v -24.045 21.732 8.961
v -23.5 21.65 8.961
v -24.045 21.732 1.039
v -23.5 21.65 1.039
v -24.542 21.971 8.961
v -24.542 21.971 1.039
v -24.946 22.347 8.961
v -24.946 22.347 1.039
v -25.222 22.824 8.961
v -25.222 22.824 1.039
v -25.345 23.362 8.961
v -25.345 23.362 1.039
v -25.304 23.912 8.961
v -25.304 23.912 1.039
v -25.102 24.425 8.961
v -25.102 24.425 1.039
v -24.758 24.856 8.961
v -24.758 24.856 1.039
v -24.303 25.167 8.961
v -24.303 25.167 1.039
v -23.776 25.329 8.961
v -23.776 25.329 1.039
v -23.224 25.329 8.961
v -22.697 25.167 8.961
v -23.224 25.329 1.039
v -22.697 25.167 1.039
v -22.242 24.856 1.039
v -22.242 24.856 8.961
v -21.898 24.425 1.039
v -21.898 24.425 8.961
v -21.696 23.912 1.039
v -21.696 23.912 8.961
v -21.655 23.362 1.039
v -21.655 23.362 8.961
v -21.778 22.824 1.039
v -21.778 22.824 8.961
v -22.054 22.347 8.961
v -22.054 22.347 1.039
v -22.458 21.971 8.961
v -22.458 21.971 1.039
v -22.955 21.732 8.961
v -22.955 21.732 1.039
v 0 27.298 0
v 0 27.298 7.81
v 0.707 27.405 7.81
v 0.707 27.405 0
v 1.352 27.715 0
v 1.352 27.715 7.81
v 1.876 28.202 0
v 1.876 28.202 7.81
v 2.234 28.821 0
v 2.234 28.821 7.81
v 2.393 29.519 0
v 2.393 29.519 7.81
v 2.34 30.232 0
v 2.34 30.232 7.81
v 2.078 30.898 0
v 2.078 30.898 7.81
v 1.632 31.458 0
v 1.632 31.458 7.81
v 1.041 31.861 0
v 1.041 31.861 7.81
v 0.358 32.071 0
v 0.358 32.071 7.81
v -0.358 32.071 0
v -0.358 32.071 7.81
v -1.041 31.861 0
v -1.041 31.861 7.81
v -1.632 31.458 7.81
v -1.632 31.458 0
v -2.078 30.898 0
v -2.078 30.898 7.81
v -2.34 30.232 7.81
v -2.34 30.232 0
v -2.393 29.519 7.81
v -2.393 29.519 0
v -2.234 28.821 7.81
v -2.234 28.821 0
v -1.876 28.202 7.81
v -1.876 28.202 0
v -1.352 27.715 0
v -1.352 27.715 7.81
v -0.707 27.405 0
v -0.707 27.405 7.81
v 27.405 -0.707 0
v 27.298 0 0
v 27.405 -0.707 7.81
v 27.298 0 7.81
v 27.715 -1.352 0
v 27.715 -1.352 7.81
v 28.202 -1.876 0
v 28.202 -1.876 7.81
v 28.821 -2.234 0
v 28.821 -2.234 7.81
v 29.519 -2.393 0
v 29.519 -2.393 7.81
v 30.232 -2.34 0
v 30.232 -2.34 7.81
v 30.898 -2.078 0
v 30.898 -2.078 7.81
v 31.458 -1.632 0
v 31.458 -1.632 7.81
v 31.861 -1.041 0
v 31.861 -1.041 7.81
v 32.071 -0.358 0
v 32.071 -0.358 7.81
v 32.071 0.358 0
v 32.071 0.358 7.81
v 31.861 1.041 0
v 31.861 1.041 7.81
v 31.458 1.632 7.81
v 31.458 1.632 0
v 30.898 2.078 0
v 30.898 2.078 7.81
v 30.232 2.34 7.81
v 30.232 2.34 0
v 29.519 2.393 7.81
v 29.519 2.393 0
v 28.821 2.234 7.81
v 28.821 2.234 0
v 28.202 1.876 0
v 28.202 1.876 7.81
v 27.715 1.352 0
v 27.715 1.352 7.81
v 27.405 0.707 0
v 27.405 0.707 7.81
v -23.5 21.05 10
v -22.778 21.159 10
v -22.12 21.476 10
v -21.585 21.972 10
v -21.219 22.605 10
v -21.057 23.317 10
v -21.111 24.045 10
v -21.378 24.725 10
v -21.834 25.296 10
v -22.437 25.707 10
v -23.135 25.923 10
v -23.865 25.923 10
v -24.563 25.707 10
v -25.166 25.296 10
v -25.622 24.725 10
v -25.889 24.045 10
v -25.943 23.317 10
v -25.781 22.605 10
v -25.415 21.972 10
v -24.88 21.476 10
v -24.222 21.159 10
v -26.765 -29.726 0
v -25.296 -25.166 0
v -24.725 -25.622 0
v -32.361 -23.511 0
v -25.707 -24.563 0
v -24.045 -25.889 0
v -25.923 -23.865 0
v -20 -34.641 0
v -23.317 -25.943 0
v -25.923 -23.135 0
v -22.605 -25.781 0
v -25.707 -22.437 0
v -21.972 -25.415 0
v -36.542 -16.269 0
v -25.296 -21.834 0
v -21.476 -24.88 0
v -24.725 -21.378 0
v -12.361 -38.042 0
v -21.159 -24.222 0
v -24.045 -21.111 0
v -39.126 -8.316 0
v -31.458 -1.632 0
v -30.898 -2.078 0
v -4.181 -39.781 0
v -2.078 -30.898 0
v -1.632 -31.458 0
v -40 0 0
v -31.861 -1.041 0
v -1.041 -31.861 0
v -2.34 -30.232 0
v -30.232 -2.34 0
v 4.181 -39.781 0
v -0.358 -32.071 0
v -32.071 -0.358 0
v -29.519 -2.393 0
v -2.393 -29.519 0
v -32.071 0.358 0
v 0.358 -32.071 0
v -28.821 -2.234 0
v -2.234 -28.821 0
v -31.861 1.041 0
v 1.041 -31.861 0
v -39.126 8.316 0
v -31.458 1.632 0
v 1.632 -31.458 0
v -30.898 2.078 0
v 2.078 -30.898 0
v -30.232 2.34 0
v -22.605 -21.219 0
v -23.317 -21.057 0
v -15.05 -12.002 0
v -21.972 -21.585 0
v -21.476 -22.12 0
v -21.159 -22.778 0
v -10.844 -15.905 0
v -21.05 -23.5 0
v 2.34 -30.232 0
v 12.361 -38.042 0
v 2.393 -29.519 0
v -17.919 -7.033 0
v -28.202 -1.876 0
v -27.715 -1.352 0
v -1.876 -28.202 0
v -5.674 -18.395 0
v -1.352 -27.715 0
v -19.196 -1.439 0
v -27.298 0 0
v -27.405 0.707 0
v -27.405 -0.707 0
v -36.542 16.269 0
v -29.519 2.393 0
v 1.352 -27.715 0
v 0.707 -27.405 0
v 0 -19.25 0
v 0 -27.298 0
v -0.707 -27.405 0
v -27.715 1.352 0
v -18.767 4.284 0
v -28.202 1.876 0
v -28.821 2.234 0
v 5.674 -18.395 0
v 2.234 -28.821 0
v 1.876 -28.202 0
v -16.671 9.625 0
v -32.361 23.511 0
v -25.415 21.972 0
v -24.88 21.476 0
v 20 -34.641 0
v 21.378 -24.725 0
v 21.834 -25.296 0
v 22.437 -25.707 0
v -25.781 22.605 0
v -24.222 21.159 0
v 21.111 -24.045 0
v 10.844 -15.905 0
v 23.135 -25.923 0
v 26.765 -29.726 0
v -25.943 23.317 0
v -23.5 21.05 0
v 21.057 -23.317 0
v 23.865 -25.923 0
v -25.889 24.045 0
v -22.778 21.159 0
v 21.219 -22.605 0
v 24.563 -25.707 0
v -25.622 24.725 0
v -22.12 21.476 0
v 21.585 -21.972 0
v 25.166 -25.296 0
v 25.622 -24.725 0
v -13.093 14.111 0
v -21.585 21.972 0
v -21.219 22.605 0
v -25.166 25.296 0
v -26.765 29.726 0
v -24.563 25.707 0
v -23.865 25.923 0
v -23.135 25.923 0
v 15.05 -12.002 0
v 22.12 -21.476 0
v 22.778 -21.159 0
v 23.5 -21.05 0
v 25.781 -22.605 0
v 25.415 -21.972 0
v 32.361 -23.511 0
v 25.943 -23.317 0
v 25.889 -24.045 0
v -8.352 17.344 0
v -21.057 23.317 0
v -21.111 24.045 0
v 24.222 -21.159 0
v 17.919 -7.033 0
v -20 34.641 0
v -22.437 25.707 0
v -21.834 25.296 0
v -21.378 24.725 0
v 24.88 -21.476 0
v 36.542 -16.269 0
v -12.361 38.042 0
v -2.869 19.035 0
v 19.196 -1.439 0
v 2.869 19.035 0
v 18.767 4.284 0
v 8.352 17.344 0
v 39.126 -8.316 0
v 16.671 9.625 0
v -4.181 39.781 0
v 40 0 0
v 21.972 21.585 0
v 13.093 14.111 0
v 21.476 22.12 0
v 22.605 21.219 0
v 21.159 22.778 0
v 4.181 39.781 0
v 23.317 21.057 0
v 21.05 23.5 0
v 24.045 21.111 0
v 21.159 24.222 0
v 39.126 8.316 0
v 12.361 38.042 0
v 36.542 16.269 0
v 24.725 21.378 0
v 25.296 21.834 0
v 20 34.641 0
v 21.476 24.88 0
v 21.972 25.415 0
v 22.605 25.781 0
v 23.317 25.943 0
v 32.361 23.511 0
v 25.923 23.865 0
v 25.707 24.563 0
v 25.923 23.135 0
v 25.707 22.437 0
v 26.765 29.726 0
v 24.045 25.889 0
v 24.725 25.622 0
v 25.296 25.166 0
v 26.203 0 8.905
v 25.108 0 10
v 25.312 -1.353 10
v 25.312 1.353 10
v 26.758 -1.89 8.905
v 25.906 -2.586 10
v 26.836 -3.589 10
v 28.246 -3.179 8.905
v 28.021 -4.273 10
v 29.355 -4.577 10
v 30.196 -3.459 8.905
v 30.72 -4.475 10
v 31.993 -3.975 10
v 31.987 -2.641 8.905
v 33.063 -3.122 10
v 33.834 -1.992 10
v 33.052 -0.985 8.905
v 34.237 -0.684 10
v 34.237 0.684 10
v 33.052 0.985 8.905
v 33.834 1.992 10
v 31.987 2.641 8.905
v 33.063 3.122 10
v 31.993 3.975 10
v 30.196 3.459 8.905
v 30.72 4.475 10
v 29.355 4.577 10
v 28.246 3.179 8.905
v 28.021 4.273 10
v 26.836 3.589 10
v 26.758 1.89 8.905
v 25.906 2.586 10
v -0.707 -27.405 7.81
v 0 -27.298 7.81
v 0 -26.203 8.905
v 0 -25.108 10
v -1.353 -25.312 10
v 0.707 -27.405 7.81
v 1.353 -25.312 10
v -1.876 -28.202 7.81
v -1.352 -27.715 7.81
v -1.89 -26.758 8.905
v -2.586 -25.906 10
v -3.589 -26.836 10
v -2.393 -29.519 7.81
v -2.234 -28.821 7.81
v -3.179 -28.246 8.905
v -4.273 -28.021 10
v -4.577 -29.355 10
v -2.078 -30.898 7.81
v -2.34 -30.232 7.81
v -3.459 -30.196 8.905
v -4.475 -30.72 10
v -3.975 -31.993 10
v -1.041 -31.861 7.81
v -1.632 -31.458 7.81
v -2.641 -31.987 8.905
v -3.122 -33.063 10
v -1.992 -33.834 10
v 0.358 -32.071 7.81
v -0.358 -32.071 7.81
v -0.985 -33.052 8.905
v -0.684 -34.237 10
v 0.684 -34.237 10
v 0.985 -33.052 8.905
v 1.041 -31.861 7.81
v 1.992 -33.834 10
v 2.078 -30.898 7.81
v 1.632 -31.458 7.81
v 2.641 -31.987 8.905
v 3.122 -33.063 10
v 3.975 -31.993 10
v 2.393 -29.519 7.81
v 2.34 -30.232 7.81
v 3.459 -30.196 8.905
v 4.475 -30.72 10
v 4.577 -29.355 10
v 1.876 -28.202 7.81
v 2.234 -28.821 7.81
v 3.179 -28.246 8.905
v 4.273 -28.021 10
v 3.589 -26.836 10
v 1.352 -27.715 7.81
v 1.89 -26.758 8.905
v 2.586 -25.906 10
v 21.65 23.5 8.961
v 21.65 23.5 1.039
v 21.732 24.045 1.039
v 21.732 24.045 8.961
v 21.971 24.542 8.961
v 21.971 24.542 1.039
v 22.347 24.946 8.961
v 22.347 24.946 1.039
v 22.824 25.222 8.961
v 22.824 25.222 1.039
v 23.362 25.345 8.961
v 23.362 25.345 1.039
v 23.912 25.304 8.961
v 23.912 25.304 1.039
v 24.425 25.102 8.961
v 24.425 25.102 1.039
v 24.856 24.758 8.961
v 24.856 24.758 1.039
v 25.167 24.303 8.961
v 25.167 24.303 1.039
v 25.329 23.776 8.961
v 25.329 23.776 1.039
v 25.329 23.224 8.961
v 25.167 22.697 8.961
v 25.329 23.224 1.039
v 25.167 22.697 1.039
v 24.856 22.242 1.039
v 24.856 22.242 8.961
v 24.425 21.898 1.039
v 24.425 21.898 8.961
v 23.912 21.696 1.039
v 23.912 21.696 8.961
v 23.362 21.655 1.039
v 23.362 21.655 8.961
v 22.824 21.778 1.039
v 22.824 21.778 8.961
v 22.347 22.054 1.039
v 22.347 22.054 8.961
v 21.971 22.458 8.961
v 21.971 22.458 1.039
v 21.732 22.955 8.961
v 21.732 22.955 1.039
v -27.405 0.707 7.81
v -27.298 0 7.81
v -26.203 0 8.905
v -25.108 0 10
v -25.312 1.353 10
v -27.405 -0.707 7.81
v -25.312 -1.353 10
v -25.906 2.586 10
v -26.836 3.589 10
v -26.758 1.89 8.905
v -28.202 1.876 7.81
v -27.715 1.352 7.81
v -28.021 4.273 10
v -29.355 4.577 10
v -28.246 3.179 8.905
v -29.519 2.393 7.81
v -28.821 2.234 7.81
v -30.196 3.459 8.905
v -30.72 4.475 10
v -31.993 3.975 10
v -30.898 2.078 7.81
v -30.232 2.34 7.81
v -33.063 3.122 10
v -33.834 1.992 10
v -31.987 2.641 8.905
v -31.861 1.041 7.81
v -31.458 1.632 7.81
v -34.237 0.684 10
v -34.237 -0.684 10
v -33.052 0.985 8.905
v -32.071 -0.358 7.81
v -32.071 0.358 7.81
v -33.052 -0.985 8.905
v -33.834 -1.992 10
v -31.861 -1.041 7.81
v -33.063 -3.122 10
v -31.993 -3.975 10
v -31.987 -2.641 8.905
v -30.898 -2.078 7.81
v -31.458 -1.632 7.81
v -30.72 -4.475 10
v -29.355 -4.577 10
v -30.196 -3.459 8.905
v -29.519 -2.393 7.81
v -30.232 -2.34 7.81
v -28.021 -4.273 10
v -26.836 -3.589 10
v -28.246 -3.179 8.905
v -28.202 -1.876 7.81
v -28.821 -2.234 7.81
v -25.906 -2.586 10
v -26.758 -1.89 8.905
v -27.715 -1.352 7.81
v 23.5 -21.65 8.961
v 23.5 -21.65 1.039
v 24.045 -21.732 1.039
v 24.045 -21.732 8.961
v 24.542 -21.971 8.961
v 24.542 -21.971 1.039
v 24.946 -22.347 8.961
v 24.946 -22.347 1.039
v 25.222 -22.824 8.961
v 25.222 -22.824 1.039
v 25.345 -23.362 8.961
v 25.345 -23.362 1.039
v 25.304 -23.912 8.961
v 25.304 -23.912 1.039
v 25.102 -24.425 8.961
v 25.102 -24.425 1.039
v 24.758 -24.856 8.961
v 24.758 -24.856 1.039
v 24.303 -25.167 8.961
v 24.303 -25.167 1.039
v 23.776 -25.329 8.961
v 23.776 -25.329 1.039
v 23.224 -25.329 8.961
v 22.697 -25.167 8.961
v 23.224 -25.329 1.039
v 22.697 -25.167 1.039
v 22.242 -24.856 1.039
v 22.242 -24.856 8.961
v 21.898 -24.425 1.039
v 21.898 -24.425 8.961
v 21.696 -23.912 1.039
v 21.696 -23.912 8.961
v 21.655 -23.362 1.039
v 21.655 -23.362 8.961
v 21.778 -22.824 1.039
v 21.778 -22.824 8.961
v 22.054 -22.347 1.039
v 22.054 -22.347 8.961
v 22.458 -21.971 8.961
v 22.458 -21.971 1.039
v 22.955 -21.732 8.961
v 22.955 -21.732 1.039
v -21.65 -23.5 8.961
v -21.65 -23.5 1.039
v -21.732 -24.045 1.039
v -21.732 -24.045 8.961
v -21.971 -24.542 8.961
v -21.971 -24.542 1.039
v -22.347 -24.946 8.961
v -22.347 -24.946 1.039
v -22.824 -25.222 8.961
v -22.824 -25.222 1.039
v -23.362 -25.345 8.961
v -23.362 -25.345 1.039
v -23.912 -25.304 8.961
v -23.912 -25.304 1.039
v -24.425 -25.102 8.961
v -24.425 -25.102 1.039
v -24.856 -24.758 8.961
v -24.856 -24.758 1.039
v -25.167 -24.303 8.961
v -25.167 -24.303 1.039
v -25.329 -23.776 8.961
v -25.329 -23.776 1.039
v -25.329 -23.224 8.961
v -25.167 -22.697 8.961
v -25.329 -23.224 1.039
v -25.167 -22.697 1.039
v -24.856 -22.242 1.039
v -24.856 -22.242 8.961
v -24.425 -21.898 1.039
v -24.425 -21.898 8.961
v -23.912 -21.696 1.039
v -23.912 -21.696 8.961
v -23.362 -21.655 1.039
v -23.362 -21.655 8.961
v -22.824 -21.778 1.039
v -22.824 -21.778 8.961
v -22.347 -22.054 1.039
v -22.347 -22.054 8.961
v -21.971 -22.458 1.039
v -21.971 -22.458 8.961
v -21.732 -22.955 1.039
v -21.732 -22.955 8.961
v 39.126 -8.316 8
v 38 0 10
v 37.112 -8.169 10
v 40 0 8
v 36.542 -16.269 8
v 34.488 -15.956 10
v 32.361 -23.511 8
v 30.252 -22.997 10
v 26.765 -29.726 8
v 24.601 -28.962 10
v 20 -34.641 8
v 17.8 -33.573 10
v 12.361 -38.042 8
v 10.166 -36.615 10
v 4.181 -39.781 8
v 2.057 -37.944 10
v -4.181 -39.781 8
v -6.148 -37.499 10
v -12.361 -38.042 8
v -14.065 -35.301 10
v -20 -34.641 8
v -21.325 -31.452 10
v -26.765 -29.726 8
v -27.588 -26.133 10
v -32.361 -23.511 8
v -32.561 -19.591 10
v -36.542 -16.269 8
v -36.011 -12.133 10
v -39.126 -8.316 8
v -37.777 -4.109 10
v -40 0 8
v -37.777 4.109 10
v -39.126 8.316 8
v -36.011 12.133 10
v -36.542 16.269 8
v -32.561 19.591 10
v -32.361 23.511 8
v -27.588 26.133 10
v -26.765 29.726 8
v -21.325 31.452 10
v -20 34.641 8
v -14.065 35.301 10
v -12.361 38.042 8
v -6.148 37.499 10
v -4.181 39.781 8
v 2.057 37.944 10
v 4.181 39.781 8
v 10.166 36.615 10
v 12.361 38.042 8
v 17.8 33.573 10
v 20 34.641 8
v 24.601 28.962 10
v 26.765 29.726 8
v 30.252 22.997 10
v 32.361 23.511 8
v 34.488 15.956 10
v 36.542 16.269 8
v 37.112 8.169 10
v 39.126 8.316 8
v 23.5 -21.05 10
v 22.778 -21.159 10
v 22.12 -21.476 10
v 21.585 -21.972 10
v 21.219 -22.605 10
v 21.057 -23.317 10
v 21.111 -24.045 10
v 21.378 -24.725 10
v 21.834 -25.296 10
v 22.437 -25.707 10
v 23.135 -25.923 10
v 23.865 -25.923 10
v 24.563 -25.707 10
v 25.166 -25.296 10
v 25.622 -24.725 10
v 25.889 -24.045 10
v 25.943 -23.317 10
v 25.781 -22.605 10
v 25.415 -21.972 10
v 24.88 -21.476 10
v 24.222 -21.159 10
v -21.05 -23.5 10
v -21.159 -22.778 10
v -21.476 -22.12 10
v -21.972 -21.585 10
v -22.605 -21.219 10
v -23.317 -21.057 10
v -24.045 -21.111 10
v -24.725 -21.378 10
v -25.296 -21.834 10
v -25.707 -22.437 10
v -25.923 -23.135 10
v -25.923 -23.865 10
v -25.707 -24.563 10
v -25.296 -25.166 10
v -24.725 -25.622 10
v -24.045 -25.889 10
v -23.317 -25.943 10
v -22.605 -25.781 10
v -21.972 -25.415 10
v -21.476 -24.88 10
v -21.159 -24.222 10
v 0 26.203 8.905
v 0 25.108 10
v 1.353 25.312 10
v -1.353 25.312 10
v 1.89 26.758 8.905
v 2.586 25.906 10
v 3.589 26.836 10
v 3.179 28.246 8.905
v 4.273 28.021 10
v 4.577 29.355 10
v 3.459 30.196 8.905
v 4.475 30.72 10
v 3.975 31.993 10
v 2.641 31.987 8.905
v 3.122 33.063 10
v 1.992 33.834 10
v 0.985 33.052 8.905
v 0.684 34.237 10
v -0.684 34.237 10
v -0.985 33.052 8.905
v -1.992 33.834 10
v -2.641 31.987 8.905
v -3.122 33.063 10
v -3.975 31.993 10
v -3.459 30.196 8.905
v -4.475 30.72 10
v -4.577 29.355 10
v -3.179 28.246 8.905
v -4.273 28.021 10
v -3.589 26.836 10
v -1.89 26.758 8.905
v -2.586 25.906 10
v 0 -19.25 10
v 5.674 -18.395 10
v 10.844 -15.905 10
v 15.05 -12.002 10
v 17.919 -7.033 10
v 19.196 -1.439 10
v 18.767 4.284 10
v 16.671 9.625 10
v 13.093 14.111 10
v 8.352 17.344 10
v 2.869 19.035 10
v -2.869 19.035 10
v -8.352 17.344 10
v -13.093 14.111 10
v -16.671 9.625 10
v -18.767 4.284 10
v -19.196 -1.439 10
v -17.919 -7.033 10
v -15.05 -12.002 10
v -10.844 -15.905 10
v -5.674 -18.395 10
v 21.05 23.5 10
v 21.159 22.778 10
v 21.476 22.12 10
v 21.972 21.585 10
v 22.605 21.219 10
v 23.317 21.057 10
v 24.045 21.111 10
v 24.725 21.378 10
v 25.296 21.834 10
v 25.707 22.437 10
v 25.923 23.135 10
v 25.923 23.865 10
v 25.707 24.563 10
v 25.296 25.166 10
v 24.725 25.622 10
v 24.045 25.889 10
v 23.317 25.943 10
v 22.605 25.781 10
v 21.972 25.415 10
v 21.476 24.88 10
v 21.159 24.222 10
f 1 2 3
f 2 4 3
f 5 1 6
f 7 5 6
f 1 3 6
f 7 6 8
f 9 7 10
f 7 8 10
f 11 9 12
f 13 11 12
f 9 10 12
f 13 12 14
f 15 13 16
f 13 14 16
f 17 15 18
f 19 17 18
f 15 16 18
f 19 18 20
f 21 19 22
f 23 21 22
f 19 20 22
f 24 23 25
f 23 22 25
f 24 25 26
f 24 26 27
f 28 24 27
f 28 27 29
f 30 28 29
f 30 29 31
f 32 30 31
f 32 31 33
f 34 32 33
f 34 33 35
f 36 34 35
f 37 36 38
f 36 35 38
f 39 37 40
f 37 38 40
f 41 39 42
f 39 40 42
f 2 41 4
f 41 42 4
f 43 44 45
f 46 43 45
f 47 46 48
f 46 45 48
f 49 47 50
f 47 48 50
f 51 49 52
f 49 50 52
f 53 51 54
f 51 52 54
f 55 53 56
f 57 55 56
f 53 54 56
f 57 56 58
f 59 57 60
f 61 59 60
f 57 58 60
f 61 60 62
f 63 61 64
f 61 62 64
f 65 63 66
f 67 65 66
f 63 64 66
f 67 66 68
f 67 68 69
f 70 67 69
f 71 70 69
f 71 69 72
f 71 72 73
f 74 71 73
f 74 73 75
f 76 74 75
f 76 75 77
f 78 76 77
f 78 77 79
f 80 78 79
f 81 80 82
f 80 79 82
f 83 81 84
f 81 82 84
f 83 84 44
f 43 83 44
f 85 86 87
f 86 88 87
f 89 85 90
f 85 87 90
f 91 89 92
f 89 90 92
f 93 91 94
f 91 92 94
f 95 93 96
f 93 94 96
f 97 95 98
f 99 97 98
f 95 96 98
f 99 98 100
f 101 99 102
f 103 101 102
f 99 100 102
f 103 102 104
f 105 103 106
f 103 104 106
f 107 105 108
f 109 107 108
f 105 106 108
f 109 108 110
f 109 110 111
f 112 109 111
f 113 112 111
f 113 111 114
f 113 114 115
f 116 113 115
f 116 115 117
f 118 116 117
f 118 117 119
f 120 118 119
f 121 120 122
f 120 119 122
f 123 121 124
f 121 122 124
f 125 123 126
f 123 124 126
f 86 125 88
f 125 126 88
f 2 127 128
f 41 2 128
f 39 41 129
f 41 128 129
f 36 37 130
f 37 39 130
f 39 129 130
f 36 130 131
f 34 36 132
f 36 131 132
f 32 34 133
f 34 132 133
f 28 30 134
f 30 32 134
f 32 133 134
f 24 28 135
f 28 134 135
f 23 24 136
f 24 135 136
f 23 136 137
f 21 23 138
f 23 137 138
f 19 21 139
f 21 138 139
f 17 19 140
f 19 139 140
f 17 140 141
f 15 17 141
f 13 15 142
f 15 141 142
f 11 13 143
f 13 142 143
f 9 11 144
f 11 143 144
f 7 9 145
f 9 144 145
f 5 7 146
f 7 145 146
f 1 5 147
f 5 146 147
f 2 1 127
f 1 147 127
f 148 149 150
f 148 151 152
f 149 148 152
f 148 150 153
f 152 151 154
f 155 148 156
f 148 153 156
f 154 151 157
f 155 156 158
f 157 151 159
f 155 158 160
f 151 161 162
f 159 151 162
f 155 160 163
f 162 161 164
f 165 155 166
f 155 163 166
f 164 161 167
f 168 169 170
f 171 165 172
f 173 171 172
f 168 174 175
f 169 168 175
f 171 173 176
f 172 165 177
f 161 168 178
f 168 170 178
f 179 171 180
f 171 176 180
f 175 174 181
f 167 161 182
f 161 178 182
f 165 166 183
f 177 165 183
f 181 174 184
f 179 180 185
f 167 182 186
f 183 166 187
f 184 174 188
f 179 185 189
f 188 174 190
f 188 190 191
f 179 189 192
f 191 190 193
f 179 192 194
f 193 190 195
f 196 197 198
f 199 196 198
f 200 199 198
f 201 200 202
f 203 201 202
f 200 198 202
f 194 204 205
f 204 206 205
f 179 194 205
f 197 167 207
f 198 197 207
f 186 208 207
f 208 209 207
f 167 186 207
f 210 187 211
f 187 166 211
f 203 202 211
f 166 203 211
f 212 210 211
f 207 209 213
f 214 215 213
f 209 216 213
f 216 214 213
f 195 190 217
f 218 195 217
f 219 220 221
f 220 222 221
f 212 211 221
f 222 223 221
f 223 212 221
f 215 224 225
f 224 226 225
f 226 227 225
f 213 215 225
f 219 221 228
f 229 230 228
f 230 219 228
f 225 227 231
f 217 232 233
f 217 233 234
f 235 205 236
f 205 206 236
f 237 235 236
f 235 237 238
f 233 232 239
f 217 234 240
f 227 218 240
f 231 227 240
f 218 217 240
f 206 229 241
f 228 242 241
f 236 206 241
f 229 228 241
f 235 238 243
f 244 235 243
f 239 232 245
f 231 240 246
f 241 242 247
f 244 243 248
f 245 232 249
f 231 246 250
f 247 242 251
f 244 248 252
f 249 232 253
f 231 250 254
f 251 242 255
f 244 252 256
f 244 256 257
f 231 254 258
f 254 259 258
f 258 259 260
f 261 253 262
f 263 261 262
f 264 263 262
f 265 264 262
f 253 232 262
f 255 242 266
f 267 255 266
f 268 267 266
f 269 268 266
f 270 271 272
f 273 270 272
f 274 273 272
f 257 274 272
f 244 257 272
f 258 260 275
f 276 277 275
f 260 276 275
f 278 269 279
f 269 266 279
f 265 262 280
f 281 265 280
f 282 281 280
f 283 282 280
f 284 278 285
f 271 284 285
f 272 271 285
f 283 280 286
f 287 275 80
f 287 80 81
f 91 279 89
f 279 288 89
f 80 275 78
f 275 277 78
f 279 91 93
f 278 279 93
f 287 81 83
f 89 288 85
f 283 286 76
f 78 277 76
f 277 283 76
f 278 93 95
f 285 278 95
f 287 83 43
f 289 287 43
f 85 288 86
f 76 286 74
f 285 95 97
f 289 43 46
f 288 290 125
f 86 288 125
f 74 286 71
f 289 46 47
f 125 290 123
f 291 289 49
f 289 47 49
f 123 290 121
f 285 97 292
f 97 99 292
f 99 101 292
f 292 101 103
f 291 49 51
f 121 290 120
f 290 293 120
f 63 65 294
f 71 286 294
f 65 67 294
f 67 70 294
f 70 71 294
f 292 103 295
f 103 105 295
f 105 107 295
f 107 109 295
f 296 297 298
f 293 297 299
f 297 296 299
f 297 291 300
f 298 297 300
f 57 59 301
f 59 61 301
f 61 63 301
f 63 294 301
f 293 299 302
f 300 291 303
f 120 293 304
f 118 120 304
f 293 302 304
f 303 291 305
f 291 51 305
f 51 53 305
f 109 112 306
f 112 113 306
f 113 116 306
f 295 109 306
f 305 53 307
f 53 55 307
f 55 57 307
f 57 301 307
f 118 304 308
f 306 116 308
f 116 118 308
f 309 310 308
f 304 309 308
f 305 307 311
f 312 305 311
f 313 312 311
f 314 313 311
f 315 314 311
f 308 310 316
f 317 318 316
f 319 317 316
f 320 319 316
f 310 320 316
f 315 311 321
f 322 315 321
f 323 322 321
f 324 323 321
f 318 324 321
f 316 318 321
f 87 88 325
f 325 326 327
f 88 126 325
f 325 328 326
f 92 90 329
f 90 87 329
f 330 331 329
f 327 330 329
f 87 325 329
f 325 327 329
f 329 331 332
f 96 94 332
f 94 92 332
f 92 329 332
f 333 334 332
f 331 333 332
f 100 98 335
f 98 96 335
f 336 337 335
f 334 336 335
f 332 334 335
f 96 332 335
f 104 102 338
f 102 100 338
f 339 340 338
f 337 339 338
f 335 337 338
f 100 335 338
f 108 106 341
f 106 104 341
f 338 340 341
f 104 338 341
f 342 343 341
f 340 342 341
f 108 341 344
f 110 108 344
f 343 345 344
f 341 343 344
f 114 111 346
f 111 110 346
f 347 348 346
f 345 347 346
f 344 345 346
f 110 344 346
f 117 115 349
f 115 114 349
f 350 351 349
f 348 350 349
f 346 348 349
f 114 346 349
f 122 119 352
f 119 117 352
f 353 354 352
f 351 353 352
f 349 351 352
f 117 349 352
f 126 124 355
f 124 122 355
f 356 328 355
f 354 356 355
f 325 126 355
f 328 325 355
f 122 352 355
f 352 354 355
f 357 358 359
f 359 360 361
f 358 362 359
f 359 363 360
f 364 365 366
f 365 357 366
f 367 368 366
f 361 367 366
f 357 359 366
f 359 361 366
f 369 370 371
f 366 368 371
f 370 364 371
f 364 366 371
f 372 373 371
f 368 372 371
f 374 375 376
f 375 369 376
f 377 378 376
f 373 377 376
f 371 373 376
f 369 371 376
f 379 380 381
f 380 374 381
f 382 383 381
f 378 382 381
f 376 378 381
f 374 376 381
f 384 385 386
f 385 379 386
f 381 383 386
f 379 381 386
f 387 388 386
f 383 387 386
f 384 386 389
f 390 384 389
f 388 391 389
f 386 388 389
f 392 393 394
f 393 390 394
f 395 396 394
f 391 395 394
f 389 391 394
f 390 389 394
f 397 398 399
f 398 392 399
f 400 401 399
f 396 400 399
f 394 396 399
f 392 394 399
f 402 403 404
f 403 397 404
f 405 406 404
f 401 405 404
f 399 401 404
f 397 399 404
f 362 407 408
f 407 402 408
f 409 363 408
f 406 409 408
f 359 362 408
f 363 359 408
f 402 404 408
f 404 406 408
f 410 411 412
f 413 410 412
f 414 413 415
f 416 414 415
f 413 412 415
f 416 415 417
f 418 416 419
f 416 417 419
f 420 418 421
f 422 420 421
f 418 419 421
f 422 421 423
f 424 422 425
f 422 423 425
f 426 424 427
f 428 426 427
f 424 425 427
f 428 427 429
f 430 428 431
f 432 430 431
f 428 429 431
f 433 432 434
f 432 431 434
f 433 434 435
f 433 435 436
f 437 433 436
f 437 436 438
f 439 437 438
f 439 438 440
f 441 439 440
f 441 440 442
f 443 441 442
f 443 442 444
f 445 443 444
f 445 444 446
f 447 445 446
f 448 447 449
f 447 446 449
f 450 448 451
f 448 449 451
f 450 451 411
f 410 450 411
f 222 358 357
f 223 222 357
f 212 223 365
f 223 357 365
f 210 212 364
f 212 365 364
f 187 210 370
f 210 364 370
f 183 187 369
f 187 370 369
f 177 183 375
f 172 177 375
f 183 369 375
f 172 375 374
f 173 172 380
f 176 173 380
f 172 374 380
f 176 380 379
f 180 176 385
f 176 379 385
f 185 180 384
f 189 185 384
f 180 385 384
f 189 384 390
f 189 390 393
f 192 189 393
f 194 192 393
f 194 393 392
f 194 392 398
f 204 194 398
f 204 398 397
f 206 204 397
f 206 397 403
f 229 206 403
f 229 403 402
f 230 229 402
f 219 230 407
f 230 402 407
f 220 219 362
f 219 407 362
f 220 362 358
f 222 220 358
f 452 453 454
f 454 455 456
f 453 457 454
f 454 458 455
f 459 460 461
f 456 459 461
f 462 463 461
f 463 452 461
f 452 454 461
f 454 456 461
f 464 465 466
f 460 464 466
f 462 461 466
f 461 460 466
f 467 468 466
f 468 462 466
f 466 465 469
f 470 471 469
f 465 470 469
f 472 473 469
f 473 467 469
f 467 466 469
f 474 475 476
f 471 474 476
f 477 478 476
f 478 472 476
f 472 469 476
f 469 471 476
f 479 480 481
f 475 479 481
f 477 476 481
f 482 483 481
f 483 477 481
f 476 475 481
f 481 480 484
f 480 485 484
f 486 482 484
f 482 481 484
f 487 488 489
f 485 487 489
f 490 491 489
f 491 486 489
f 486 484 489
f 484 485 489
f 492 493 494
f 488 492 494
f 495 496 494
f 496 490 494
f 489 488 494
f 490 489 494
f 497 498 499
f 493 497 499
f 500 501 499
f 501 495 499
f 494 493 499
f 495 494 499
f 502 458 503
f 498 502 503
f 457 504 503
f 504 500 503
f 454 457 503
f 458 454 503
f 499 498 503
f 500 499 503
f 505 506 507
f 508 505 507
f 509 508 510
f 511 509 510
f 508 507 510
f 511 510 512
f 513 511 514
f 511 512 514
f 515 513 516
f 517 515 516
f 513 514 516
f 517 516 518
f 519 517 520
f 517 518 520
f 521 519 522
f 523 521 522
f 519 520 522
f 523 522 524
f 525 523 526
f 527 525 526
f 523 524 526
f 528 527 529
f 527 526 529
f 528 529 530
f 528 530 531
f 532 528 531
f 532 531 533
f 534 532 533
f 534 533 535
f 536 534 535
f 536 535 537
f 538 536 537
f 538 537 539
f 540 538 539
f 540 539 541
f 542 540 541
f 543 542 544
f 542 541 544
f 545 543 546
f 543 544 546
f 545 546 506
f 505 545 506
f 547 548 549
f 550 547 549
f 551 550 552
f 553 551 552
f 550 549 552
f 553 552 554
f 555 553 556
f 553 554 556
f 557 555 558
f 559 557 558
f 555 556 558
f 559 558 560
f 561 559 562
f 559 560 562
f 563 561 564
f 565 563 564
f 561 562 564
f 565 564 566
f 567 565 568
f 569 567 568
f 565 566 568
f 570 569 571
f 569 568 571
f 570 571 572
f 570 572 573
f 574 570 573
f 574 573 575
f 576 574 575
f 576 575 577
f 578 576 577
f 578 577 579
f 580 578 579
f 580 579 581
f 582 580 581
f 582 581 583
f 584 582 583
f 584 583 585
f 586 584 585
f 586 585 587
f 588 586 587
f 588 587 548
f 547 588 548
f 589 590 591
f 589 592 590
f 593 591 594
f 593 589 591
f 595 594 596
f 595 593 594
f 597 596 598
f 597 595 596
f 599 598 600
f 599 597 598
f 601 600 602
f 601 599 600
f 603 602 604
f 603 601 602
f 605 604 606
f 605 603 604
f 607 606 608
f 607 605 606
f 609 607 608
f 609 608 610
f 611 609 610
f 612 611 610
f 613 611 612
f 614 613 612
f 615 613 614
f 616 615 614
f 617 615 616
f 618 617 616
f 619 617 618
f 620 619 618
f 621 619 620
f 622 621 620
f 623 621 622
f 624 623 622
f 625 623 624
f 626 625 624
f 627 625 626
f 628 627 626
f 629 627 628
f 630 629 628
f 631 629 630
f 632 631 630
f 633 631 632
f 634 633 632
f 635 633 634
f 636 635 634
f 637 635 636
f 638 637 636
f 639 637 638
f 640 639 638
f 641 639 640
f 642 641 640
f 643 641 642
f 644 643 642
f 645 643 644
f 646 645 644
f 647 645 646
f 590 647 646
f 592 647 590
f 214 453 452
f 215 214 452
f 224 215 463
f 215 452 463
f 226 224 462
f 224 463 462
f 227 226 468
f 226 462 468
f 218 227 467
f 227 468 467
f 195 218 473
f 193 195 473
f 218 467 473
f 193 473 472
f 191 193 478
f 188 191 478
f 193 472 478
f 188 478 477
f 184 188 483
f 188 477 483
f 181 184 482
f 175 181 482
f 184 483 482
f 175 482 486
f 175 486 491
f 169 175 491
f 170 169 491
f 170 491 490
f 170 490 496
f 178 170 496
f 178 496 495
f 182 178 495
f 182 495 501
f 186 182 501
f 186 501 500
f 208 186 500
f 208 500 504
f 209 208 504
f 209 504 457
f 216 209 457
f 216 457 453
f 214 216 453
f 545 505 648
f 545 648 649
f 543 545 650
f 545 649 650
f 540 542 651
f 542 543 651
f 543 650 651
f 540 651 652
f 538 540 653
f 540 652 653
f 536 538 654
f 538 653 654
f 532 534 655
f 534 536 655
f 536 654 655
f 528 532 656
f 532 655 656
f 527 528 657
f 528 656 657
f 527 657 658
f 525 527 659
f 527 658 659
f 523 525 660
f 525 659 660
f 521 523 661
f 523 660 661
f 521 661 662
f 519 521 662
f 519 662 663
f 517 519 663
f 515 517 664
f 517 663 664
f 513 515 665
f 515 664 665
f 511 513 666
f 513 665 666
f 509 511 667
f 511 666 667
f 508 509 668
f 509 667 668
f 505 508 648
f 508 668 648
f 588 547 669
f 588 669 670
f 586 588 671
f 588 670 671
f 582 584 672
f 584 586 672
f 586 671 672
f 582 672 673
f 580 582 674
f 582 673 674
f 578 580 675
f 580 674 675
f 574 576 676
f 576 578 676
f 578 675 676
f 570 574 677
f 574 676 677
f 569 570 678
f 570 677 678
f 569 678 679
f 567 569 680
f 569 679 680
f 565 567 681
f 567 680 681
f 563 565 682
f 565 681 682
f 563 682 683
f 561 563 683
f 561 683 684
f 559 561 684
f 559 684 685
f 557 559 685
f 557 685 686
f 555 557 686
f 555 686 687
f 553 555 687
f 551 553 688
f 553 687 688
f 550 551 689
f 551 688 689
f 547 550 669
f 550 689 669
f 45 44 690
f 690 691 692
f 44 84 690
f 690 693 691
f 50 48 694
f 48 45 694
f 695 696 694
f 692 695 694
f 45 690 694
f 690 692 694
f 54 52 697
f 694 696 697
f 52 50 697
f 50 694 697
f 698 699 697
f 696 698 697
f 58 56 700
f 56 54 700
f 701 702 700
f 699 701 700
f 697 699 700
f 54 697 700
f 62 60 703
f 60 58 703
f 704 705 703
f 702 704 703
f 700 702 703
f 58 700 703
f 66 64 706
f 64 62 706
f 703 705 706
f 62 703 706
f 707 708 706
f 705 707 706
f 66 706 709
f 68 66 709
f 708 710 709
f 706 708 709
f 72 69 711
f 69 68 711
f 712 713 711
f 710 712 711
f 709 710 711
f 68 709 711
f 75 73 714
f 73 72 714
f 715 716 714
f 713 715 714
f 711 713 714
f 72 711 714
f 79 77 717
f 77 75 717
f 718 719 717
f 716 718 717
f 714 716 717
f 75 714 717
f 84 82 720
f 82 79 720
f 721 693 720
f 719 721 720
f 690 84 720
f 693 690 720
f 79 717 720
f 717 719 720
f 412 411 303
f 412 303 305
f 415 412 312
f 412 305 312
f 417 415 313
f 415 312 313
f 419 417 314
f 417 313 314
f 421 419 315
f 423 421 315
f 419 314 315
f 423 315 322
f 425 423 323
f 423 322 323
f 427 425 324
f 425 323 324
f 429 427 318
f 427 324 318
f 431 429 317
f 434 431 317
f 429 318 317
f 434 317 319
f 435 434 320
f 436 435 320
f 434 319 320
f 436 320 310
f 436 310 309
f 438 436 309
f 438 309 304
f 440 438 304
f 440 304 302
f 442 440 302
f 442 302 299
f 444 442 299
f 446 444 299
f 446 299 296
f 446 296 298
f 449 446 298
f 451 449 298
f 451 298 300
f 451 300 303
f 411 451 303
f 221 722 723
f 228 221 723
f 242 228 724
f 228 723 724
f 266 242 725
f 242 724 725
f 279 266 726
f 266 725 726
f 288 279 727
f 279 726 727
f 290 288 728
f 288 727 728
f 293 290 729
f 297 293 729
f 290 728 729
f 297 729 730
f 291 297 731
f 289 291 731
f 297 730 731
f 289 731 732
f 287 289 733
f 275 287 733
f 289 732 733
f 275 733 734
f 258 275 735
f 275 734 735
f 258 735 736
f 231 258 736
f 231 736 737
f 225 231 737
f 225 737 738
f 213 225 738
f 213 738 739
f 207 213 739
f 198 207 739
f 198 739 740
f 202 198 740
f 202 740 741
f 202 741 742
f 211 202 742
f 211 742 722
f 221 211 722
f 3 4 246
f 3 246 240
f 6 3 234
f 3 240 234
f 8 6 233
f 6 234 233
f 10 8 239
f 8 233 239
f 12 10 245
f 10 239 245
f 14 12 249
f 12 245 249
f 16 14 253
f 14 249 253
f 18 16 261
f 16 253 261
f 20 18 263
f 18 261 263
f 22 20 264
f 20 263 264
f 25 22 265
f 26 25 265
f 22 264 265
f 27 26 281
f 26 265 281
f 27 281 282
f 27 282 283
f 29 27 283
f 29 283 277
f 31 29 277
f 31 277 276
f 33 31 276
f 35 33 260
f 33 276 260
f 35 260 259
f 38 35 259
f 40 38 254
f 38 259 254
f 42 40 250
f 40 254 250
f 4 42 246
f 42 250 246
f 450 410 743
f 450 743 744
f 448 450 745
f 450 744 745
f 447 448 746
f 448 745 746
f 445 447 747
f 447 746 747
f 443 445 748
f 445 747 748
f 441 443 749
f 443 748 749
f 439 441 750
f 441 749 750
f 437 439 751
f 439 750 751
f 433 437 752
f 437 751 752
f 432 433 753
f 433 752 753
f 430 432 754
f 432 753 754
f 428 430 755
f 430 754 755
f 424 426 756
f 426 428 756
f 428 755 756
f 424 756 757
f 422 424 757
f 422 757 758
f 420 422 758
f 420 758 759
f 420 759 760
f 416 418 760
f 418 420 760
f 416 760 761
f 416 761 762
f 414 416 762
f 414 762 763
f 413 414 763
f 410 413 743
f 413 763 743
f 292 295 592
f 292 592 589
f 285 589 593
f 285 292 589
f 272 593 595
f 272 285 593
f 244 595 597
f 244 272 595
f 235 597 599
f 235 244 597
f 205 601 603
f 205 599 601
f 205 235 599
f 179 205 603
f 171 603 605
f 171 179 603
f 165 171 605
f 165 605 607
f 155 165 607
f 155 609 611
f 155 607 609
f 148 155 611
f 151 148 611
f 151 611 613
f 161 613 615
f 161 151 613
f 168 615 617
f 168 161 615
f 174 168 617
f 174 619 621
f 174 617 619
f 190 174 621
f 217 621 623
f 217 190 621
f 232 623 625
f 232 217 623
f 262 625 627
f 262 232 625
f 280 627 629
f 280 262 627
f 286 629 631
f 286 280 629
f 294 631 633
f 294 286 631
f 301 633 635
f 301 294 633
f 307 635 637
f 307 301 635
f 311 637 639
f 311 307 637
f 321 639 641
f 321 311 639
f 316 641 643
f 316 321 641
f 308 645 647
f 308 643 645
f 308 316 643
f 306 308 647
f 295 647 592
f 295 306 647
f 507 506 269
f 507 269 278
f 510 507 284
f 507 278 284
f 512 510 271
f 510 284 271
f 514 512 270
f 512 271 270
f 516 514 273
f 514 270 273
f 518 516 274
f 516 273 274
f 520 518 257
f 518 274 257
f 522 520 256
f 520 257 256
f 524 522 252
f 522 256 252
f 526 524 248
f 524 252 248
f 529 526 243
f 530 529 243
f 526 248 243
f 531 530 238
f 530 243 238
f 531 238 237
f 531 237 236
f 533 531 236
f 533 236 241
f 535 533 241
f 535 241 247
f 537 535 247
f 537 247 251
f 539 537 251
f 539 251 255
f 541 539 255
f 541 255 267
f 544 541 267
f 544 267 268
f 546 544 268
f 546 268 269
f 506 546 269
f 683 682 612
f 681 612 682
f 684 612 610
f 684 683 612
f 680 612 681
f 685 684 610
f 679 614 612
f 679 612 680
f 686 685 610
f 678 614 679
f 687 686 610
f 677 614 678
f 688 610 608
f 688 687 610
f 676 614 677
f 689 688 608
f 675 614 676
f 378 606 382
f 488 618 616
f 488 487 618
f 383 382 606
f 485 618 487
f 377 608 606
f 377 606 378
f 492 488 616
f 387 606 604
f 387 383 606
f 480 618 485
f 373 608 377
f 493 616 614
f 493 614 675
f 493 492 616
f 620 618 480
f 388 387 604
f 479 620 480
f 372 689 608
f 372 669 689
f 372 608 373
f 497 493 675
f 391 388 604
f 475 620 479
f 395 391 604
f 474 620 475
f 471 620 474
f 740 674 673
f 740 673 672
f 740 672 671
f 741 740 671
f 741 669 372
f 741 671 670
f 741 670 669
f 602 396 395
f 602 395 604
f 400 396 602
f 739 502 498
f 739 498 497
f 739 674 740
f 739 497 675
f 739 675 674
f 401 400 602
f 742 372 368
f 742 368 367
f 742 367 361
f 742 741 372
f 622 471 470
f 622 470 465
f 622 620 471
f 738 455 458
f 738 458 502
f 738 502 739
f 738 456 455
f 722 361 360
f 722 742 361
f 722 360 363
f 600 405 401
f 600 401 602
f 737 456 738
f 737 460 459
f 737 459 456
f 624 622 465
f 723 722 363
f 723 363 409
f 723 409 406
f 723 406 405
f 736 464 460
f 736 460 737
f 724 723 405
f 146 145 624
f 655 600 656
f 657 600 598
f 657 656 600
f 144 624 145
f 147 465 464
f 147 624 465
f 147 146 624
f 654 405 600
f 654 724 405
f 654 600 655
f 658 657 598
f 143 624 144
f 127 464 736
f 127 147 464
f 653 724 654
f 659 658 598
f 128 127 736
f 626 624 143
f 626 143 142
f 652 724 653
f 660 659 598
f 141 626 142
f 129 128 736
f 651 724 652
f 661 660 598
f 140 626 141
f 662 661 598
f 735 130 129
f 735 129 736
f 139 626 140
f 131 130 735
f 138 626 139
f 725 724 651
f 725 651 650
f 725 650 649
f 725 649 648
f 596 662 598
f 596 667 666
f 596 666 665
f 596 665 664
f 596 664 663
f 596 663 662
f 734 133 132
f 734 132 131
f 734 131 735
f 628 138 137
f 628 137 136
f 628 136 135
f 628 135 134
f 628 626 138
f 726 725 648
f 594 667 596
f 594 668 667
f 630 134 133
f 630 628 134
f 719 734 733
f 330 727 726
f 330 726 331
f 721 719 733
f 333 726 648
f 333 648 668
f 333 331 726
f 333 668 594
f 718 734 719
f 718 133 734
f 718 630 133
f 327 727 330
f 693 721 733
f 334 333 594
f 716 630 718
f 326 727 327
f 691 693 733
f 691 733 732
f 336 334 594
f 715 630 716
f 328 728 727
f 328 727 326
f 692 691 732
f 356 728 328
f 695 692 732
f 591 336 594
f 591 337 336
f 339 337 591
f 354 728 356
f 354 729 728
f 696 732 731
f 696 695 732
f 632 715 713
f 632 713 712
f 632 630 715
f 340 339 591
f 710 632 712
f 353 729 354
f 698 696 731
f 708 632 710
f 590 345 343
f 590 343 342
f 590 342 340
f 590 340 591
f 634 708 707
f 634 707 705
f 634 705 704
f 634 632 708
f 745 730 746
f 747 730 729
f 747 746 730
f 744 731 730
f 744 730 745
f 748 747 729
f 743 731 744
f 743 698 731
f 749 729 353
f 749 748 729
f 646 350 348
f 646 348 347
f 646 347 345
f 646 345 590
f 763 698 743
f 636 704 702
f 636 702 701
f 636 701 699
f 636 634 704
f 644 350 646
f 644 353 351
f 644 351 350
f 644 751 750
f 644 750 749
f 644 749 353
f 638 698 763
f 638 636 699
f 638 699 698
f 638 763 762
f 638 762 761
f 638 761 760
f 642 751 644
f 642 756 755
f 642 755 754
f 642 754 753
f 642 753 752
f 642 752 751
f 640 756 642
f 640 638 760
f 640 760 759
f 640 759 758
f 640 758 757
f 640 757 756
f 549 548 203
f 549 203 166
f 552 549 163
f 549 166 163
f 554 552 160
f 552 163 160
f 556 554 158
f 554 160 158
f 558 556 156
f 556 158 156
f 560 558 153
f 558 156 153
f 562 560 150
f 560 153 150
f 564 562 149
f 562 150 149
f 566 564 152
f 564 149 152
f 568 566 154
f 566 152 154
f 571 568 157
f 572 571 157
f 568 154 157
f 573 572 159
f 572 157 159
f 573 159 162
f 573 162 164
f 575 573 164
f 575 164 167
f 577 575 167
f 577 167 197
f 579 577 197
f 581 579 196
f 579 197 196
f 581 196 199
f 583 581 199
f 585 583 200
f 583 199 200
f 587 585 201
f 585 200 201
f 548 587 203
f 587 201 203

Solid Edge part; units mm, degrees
sketch "Sketch1" plane through (0, 0, 0) normal (0, 0, 1) x (1, 0, 0)
  circle A0 centre (0, 0) radius 40
  dimension "D1" = 80
extrude "Protrusion1" add sketch "Sketch1" along normal blind 10
hole "main_hole" at (0, 0, 10) direction (0, 0, -1) diameter 38.5 end up to next
hole "Hole_2" at (0, 29.6982, 10) direction (0, 0, -1) diameter 4.8 end up to next countersink diameter 9.18 countersink angle 90
hole "Hole_3" at (-23.5, 23.5, 10) direction (0, 0, -1) diameter 3.7 depth 30 tip angle 118 start chamfer 0.6 start chamfer angle 30 end chamfer 0.6 end chamfer angle 30
chamfer "Chamfer_1" distance 2 angle 45 1 edges at (-40, 0, 10)
pattern_circular "Pattern1" count 4 over 360 about axis through (0, 0, 10) along (0, 0, 1) of "Hole_2", "Hole_3"
properties material "Polyethylene, low density"
